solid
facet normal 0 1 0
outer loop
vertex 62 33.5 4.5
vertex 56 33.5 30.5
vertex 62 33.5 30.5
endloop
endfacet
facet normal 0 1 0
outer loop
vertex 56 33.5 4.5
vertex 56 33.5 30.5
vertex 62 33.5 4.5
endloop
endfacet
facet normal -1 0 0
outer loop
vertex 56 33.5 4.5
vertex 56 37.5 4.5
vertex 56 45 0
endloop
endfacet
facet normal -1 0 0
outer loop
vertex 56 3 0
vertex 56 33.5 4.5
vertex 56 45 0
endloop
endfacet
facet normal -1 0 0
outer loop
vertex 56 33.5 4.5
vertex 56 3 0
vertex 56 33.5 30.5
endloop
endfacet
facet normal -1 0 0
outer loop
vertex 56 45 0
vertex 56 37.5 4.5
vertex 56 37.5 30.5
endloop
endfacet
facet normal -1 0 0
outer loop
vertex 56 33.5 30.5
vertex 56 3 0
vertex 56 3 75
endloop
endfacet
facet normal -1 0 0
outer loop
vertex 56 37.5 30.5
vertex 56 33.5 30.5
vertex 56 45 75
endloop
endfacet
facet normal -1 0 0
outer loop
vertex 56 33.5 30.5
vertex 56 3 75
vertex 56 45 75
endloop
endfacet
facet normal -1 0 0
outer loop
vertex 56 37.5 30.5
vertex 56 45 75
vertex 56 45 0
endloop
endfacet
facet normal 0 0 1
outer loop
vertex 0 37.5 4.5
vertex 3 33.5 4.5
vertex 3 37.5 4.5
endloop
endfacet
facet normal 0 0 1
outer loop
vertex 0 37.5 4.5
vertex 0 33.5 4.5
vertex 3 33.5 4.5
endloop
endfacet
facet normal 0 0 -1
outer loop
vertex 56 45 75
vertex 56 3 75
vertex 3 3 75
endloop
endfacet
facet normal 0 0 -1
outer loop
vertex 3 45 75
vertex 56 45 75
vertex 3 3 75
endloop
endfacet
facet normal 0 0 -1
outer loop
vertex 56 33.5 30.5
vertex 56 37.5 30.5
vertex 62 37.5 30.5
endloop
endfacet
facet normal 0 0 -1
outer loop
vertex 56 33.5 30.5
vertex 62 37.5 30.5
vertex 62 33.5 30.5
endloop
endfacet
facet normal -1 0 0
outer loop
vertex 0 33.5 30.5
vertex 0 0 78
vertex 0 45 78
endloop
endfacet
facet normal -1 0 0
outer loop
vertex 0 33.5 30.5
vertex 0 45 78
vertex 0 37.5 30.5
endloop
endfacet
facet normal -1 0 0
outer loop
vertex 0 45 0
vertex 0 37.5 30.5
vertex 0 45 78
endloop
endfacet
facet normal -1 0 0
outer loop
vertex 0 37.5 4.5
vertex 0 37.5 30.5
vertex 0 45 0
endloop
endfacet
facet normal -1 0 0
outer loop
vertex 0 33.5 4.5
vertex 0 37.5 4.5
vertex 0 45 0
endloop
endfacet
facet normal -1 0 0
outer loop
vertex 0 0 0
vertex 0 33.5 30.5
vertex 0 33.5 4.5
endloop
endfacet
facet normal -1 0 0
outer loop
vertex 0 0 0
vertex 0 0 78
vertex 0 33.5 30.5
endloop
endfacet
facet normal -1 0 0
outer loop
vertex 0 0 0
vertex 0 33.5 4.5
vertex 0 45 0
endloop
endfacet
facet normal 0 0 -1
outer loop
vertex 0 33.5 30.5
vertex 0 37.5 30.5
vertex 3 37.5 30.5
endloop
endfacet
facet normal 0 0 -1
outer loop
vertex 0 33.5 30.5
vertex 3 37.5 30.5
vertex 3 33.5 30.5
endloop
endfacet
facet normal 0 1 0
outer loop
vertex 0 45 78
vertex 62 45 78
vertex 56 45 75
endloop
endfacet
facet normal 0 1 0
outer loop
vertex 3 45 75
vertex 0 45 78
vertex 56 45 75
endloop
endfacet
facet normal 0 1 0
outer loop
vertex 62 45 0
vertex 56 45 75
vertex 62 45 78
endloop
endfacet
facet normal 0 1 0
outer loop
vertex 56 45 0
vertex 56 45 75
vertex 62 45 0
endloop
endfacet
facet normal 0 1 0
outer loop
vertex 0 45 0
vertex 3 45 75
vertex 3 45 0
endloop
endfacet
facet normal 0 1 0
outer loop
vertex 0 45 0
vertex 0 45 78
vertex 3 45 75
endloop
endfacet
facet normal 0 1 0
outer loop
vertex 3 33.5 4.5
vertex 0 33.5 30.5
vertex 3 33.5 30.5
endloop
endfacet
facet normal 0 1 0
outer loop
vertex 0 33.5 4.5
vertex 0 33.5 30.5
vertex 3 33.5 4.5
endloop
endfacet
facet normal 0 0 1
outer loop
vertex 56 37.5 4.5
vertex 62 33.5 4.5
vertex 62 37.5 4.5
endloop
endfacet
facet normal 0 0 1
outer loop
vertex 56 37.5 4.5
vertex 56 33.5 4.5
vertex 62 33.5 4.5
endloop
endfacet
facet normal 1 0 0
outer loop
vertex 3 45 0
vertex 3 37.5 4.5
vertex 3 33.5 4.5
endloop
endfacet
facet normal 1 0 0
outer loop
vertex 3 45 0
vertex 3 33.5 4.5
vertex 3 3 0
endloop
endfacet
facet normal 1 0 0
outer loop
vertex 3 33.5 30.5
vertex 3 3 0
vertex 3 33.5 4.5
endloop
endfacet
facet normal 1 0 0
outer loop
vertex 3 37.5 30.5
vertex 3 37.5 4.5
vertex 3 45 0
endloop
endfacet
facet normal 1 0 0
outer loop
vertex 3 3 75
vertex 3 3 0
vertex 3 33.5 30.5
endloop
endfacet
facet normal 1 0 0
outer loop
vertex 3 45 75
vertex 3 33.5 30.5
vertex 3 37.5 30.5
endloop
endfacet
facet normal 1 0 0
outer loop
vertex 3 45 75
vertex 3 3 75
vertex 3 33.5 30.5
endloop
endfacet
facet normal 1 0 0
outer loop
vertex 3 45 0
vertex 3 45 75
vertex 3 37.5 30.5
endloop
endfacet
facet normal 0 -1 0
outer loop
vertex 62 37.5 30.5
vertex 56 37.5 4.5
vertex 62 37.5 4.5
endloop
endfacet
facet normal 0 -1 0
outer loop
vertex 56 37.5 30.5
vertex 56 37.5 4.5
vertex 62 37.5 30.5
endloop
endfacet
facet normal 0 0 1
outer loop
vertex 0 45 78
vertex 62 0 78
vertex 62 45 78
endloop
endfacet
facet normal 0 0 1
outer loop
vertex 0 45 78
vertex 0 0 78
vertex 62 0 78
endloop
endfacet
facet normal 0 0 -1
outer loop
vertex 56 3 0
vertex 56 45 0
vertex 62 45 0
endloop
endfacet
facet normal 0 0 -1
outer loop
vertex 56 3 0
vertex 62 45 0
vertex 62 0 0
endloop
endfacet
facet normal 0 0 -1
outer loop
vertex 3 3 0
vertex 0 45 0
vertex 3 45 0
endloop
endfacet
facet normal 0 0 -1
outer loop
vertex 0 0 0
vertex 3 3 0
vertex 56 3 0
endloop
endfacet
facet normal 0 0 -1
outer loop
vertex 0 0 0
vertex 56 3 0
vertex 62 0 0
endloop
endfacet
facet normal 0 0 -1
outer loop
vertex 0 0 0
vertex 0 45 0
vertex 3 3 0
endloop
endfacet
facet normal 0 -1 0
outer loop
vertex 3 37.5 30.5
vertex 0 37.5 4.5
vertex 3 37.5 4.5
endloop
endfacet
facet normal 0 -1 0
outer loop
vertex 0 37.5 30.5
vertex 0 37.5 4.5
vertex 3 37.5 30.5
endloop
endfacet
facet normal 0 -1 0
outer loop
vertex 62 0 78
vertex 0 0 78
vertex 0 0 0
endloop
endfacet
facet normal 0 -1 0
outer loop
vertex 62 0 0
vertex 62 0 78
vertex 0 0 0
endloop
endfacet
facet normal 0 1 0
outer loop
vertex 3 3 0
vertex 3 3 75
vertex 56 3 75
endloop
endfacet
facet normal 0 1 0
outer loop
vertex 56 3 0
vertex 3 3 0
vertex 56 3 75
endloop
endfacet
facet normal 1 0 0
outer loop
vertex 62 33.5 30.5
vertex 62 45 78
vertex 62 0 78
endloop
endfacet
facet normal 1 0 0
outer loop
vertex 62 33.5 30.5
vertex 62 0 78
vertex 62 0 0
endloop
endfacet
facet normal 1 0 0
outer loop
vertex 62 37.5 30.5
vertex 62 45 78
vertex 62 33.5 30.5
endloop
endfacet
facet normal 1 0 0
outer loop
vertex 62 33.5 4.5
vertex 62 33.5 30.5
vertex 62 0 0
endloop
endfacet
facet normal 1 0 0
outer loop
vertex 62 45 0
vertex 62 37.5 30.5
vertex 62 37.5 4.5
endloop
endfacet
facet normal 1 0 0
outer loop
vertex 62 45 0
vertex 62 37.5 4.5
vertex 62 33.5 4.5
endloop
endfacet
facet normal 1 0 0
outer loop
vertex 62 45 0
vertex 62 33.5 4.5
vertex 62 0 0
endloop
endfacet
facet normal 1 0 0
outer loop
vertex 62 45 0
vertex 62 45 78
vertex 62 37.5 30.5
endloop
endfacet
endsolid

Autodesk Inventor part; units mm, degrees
ref_plane "YZ Plane" through (0, 0, 0) normal (1, 0, 0) x (0, 1, 0)
ref_plane "XZ Plane" through (0, 0, 0) normal (0, 1, 0) x (-1, 0, 0)
ref_plane "XY Plane" through (0, 0, 0) normal (0, 0, 1) x (1, 0, 0)
sketch "Sketch2" plane through (0, 0, 0) normal (0, 1, 0) x (-1, 0, 0)
  line L0 (0, 0) -> (-59, 0)
  line L1 (-59, 0) -> (-59, 78)
  line L2 (-59, 78) -> (0, 78)
  line L3 (0, 78) -> (0, 0)
  dimension "d0" = 59
  dimension "d1" = 78
extrude "Extrusion1" add sketch "Sketch2" along normal blind 45
shell "Shell1" thickness 3 removed faces 1 at (39.3333, 45, 52)
sketch "Sketch4" plane through (59, 0, 0) normal (0, 0, -1) x (-1, 0, 0)
  point P0 (59, 0)
sketch "Sketch5" plane through (3, 3, 3) normal (0, 0, 1) x (1, 0, 0)
  line L0 (0, 0) -> (0, 42) projected
  line L1 (0, 42) -> (53, 42) projected
  line L2 (0, 0) -> (53, 0)
  line L3 (53, 0) -> (53, 42)
  line L4 (53, 42) -> (0, 42)
  line L5 (0, 42) -> (0, 0)
  point P0 (-3, -3)
extrude "Extrusion3" cut sketch "Sketch5" against normal blind 10
sketch "Sketch6" plane through (0, 0, 0) normal (-1, 0, 0) x (0, 0, 1)
  line L0 (4.5, 37.5) -> (30.5, 37.5)
  line L1 (30.5, 37.5) -> (30.5, 33.5)
  line L2 (30.5, 33.5) -> (4.5, 33.5)
  line L3 (4.5, 33.5) -> (4.5, 37.5)
  line L4 (0, 0) -> (0, 45) projected
  line L5 (0, 0) -> (78, 0) projected
  dimension "d19" = 26
  dimension "d20" = 4
  dimension "d21" = 4.5
  dimension "d22" = 33.5
sketch "Sketch7" plane through (59, 0, 78) normal (1, 0, 0) x (0, 0, -1)
  line L0 (0, 0) -> (78, 0) projected
  line L1 (0, 45) -> (78, 45)
  line L2 (78, 45) -> (78, 0)
  line L3 (78, 0) -> (0, 0)
  line L4 (0, 0) -> (0, 45)
extrude "Extrusion5" add sketch "Sketch7" along normal blind 3
extrude "Extrusion6" cut sketch "Sketch6" against normal through all
properties part number "arduino with shield box v04"
